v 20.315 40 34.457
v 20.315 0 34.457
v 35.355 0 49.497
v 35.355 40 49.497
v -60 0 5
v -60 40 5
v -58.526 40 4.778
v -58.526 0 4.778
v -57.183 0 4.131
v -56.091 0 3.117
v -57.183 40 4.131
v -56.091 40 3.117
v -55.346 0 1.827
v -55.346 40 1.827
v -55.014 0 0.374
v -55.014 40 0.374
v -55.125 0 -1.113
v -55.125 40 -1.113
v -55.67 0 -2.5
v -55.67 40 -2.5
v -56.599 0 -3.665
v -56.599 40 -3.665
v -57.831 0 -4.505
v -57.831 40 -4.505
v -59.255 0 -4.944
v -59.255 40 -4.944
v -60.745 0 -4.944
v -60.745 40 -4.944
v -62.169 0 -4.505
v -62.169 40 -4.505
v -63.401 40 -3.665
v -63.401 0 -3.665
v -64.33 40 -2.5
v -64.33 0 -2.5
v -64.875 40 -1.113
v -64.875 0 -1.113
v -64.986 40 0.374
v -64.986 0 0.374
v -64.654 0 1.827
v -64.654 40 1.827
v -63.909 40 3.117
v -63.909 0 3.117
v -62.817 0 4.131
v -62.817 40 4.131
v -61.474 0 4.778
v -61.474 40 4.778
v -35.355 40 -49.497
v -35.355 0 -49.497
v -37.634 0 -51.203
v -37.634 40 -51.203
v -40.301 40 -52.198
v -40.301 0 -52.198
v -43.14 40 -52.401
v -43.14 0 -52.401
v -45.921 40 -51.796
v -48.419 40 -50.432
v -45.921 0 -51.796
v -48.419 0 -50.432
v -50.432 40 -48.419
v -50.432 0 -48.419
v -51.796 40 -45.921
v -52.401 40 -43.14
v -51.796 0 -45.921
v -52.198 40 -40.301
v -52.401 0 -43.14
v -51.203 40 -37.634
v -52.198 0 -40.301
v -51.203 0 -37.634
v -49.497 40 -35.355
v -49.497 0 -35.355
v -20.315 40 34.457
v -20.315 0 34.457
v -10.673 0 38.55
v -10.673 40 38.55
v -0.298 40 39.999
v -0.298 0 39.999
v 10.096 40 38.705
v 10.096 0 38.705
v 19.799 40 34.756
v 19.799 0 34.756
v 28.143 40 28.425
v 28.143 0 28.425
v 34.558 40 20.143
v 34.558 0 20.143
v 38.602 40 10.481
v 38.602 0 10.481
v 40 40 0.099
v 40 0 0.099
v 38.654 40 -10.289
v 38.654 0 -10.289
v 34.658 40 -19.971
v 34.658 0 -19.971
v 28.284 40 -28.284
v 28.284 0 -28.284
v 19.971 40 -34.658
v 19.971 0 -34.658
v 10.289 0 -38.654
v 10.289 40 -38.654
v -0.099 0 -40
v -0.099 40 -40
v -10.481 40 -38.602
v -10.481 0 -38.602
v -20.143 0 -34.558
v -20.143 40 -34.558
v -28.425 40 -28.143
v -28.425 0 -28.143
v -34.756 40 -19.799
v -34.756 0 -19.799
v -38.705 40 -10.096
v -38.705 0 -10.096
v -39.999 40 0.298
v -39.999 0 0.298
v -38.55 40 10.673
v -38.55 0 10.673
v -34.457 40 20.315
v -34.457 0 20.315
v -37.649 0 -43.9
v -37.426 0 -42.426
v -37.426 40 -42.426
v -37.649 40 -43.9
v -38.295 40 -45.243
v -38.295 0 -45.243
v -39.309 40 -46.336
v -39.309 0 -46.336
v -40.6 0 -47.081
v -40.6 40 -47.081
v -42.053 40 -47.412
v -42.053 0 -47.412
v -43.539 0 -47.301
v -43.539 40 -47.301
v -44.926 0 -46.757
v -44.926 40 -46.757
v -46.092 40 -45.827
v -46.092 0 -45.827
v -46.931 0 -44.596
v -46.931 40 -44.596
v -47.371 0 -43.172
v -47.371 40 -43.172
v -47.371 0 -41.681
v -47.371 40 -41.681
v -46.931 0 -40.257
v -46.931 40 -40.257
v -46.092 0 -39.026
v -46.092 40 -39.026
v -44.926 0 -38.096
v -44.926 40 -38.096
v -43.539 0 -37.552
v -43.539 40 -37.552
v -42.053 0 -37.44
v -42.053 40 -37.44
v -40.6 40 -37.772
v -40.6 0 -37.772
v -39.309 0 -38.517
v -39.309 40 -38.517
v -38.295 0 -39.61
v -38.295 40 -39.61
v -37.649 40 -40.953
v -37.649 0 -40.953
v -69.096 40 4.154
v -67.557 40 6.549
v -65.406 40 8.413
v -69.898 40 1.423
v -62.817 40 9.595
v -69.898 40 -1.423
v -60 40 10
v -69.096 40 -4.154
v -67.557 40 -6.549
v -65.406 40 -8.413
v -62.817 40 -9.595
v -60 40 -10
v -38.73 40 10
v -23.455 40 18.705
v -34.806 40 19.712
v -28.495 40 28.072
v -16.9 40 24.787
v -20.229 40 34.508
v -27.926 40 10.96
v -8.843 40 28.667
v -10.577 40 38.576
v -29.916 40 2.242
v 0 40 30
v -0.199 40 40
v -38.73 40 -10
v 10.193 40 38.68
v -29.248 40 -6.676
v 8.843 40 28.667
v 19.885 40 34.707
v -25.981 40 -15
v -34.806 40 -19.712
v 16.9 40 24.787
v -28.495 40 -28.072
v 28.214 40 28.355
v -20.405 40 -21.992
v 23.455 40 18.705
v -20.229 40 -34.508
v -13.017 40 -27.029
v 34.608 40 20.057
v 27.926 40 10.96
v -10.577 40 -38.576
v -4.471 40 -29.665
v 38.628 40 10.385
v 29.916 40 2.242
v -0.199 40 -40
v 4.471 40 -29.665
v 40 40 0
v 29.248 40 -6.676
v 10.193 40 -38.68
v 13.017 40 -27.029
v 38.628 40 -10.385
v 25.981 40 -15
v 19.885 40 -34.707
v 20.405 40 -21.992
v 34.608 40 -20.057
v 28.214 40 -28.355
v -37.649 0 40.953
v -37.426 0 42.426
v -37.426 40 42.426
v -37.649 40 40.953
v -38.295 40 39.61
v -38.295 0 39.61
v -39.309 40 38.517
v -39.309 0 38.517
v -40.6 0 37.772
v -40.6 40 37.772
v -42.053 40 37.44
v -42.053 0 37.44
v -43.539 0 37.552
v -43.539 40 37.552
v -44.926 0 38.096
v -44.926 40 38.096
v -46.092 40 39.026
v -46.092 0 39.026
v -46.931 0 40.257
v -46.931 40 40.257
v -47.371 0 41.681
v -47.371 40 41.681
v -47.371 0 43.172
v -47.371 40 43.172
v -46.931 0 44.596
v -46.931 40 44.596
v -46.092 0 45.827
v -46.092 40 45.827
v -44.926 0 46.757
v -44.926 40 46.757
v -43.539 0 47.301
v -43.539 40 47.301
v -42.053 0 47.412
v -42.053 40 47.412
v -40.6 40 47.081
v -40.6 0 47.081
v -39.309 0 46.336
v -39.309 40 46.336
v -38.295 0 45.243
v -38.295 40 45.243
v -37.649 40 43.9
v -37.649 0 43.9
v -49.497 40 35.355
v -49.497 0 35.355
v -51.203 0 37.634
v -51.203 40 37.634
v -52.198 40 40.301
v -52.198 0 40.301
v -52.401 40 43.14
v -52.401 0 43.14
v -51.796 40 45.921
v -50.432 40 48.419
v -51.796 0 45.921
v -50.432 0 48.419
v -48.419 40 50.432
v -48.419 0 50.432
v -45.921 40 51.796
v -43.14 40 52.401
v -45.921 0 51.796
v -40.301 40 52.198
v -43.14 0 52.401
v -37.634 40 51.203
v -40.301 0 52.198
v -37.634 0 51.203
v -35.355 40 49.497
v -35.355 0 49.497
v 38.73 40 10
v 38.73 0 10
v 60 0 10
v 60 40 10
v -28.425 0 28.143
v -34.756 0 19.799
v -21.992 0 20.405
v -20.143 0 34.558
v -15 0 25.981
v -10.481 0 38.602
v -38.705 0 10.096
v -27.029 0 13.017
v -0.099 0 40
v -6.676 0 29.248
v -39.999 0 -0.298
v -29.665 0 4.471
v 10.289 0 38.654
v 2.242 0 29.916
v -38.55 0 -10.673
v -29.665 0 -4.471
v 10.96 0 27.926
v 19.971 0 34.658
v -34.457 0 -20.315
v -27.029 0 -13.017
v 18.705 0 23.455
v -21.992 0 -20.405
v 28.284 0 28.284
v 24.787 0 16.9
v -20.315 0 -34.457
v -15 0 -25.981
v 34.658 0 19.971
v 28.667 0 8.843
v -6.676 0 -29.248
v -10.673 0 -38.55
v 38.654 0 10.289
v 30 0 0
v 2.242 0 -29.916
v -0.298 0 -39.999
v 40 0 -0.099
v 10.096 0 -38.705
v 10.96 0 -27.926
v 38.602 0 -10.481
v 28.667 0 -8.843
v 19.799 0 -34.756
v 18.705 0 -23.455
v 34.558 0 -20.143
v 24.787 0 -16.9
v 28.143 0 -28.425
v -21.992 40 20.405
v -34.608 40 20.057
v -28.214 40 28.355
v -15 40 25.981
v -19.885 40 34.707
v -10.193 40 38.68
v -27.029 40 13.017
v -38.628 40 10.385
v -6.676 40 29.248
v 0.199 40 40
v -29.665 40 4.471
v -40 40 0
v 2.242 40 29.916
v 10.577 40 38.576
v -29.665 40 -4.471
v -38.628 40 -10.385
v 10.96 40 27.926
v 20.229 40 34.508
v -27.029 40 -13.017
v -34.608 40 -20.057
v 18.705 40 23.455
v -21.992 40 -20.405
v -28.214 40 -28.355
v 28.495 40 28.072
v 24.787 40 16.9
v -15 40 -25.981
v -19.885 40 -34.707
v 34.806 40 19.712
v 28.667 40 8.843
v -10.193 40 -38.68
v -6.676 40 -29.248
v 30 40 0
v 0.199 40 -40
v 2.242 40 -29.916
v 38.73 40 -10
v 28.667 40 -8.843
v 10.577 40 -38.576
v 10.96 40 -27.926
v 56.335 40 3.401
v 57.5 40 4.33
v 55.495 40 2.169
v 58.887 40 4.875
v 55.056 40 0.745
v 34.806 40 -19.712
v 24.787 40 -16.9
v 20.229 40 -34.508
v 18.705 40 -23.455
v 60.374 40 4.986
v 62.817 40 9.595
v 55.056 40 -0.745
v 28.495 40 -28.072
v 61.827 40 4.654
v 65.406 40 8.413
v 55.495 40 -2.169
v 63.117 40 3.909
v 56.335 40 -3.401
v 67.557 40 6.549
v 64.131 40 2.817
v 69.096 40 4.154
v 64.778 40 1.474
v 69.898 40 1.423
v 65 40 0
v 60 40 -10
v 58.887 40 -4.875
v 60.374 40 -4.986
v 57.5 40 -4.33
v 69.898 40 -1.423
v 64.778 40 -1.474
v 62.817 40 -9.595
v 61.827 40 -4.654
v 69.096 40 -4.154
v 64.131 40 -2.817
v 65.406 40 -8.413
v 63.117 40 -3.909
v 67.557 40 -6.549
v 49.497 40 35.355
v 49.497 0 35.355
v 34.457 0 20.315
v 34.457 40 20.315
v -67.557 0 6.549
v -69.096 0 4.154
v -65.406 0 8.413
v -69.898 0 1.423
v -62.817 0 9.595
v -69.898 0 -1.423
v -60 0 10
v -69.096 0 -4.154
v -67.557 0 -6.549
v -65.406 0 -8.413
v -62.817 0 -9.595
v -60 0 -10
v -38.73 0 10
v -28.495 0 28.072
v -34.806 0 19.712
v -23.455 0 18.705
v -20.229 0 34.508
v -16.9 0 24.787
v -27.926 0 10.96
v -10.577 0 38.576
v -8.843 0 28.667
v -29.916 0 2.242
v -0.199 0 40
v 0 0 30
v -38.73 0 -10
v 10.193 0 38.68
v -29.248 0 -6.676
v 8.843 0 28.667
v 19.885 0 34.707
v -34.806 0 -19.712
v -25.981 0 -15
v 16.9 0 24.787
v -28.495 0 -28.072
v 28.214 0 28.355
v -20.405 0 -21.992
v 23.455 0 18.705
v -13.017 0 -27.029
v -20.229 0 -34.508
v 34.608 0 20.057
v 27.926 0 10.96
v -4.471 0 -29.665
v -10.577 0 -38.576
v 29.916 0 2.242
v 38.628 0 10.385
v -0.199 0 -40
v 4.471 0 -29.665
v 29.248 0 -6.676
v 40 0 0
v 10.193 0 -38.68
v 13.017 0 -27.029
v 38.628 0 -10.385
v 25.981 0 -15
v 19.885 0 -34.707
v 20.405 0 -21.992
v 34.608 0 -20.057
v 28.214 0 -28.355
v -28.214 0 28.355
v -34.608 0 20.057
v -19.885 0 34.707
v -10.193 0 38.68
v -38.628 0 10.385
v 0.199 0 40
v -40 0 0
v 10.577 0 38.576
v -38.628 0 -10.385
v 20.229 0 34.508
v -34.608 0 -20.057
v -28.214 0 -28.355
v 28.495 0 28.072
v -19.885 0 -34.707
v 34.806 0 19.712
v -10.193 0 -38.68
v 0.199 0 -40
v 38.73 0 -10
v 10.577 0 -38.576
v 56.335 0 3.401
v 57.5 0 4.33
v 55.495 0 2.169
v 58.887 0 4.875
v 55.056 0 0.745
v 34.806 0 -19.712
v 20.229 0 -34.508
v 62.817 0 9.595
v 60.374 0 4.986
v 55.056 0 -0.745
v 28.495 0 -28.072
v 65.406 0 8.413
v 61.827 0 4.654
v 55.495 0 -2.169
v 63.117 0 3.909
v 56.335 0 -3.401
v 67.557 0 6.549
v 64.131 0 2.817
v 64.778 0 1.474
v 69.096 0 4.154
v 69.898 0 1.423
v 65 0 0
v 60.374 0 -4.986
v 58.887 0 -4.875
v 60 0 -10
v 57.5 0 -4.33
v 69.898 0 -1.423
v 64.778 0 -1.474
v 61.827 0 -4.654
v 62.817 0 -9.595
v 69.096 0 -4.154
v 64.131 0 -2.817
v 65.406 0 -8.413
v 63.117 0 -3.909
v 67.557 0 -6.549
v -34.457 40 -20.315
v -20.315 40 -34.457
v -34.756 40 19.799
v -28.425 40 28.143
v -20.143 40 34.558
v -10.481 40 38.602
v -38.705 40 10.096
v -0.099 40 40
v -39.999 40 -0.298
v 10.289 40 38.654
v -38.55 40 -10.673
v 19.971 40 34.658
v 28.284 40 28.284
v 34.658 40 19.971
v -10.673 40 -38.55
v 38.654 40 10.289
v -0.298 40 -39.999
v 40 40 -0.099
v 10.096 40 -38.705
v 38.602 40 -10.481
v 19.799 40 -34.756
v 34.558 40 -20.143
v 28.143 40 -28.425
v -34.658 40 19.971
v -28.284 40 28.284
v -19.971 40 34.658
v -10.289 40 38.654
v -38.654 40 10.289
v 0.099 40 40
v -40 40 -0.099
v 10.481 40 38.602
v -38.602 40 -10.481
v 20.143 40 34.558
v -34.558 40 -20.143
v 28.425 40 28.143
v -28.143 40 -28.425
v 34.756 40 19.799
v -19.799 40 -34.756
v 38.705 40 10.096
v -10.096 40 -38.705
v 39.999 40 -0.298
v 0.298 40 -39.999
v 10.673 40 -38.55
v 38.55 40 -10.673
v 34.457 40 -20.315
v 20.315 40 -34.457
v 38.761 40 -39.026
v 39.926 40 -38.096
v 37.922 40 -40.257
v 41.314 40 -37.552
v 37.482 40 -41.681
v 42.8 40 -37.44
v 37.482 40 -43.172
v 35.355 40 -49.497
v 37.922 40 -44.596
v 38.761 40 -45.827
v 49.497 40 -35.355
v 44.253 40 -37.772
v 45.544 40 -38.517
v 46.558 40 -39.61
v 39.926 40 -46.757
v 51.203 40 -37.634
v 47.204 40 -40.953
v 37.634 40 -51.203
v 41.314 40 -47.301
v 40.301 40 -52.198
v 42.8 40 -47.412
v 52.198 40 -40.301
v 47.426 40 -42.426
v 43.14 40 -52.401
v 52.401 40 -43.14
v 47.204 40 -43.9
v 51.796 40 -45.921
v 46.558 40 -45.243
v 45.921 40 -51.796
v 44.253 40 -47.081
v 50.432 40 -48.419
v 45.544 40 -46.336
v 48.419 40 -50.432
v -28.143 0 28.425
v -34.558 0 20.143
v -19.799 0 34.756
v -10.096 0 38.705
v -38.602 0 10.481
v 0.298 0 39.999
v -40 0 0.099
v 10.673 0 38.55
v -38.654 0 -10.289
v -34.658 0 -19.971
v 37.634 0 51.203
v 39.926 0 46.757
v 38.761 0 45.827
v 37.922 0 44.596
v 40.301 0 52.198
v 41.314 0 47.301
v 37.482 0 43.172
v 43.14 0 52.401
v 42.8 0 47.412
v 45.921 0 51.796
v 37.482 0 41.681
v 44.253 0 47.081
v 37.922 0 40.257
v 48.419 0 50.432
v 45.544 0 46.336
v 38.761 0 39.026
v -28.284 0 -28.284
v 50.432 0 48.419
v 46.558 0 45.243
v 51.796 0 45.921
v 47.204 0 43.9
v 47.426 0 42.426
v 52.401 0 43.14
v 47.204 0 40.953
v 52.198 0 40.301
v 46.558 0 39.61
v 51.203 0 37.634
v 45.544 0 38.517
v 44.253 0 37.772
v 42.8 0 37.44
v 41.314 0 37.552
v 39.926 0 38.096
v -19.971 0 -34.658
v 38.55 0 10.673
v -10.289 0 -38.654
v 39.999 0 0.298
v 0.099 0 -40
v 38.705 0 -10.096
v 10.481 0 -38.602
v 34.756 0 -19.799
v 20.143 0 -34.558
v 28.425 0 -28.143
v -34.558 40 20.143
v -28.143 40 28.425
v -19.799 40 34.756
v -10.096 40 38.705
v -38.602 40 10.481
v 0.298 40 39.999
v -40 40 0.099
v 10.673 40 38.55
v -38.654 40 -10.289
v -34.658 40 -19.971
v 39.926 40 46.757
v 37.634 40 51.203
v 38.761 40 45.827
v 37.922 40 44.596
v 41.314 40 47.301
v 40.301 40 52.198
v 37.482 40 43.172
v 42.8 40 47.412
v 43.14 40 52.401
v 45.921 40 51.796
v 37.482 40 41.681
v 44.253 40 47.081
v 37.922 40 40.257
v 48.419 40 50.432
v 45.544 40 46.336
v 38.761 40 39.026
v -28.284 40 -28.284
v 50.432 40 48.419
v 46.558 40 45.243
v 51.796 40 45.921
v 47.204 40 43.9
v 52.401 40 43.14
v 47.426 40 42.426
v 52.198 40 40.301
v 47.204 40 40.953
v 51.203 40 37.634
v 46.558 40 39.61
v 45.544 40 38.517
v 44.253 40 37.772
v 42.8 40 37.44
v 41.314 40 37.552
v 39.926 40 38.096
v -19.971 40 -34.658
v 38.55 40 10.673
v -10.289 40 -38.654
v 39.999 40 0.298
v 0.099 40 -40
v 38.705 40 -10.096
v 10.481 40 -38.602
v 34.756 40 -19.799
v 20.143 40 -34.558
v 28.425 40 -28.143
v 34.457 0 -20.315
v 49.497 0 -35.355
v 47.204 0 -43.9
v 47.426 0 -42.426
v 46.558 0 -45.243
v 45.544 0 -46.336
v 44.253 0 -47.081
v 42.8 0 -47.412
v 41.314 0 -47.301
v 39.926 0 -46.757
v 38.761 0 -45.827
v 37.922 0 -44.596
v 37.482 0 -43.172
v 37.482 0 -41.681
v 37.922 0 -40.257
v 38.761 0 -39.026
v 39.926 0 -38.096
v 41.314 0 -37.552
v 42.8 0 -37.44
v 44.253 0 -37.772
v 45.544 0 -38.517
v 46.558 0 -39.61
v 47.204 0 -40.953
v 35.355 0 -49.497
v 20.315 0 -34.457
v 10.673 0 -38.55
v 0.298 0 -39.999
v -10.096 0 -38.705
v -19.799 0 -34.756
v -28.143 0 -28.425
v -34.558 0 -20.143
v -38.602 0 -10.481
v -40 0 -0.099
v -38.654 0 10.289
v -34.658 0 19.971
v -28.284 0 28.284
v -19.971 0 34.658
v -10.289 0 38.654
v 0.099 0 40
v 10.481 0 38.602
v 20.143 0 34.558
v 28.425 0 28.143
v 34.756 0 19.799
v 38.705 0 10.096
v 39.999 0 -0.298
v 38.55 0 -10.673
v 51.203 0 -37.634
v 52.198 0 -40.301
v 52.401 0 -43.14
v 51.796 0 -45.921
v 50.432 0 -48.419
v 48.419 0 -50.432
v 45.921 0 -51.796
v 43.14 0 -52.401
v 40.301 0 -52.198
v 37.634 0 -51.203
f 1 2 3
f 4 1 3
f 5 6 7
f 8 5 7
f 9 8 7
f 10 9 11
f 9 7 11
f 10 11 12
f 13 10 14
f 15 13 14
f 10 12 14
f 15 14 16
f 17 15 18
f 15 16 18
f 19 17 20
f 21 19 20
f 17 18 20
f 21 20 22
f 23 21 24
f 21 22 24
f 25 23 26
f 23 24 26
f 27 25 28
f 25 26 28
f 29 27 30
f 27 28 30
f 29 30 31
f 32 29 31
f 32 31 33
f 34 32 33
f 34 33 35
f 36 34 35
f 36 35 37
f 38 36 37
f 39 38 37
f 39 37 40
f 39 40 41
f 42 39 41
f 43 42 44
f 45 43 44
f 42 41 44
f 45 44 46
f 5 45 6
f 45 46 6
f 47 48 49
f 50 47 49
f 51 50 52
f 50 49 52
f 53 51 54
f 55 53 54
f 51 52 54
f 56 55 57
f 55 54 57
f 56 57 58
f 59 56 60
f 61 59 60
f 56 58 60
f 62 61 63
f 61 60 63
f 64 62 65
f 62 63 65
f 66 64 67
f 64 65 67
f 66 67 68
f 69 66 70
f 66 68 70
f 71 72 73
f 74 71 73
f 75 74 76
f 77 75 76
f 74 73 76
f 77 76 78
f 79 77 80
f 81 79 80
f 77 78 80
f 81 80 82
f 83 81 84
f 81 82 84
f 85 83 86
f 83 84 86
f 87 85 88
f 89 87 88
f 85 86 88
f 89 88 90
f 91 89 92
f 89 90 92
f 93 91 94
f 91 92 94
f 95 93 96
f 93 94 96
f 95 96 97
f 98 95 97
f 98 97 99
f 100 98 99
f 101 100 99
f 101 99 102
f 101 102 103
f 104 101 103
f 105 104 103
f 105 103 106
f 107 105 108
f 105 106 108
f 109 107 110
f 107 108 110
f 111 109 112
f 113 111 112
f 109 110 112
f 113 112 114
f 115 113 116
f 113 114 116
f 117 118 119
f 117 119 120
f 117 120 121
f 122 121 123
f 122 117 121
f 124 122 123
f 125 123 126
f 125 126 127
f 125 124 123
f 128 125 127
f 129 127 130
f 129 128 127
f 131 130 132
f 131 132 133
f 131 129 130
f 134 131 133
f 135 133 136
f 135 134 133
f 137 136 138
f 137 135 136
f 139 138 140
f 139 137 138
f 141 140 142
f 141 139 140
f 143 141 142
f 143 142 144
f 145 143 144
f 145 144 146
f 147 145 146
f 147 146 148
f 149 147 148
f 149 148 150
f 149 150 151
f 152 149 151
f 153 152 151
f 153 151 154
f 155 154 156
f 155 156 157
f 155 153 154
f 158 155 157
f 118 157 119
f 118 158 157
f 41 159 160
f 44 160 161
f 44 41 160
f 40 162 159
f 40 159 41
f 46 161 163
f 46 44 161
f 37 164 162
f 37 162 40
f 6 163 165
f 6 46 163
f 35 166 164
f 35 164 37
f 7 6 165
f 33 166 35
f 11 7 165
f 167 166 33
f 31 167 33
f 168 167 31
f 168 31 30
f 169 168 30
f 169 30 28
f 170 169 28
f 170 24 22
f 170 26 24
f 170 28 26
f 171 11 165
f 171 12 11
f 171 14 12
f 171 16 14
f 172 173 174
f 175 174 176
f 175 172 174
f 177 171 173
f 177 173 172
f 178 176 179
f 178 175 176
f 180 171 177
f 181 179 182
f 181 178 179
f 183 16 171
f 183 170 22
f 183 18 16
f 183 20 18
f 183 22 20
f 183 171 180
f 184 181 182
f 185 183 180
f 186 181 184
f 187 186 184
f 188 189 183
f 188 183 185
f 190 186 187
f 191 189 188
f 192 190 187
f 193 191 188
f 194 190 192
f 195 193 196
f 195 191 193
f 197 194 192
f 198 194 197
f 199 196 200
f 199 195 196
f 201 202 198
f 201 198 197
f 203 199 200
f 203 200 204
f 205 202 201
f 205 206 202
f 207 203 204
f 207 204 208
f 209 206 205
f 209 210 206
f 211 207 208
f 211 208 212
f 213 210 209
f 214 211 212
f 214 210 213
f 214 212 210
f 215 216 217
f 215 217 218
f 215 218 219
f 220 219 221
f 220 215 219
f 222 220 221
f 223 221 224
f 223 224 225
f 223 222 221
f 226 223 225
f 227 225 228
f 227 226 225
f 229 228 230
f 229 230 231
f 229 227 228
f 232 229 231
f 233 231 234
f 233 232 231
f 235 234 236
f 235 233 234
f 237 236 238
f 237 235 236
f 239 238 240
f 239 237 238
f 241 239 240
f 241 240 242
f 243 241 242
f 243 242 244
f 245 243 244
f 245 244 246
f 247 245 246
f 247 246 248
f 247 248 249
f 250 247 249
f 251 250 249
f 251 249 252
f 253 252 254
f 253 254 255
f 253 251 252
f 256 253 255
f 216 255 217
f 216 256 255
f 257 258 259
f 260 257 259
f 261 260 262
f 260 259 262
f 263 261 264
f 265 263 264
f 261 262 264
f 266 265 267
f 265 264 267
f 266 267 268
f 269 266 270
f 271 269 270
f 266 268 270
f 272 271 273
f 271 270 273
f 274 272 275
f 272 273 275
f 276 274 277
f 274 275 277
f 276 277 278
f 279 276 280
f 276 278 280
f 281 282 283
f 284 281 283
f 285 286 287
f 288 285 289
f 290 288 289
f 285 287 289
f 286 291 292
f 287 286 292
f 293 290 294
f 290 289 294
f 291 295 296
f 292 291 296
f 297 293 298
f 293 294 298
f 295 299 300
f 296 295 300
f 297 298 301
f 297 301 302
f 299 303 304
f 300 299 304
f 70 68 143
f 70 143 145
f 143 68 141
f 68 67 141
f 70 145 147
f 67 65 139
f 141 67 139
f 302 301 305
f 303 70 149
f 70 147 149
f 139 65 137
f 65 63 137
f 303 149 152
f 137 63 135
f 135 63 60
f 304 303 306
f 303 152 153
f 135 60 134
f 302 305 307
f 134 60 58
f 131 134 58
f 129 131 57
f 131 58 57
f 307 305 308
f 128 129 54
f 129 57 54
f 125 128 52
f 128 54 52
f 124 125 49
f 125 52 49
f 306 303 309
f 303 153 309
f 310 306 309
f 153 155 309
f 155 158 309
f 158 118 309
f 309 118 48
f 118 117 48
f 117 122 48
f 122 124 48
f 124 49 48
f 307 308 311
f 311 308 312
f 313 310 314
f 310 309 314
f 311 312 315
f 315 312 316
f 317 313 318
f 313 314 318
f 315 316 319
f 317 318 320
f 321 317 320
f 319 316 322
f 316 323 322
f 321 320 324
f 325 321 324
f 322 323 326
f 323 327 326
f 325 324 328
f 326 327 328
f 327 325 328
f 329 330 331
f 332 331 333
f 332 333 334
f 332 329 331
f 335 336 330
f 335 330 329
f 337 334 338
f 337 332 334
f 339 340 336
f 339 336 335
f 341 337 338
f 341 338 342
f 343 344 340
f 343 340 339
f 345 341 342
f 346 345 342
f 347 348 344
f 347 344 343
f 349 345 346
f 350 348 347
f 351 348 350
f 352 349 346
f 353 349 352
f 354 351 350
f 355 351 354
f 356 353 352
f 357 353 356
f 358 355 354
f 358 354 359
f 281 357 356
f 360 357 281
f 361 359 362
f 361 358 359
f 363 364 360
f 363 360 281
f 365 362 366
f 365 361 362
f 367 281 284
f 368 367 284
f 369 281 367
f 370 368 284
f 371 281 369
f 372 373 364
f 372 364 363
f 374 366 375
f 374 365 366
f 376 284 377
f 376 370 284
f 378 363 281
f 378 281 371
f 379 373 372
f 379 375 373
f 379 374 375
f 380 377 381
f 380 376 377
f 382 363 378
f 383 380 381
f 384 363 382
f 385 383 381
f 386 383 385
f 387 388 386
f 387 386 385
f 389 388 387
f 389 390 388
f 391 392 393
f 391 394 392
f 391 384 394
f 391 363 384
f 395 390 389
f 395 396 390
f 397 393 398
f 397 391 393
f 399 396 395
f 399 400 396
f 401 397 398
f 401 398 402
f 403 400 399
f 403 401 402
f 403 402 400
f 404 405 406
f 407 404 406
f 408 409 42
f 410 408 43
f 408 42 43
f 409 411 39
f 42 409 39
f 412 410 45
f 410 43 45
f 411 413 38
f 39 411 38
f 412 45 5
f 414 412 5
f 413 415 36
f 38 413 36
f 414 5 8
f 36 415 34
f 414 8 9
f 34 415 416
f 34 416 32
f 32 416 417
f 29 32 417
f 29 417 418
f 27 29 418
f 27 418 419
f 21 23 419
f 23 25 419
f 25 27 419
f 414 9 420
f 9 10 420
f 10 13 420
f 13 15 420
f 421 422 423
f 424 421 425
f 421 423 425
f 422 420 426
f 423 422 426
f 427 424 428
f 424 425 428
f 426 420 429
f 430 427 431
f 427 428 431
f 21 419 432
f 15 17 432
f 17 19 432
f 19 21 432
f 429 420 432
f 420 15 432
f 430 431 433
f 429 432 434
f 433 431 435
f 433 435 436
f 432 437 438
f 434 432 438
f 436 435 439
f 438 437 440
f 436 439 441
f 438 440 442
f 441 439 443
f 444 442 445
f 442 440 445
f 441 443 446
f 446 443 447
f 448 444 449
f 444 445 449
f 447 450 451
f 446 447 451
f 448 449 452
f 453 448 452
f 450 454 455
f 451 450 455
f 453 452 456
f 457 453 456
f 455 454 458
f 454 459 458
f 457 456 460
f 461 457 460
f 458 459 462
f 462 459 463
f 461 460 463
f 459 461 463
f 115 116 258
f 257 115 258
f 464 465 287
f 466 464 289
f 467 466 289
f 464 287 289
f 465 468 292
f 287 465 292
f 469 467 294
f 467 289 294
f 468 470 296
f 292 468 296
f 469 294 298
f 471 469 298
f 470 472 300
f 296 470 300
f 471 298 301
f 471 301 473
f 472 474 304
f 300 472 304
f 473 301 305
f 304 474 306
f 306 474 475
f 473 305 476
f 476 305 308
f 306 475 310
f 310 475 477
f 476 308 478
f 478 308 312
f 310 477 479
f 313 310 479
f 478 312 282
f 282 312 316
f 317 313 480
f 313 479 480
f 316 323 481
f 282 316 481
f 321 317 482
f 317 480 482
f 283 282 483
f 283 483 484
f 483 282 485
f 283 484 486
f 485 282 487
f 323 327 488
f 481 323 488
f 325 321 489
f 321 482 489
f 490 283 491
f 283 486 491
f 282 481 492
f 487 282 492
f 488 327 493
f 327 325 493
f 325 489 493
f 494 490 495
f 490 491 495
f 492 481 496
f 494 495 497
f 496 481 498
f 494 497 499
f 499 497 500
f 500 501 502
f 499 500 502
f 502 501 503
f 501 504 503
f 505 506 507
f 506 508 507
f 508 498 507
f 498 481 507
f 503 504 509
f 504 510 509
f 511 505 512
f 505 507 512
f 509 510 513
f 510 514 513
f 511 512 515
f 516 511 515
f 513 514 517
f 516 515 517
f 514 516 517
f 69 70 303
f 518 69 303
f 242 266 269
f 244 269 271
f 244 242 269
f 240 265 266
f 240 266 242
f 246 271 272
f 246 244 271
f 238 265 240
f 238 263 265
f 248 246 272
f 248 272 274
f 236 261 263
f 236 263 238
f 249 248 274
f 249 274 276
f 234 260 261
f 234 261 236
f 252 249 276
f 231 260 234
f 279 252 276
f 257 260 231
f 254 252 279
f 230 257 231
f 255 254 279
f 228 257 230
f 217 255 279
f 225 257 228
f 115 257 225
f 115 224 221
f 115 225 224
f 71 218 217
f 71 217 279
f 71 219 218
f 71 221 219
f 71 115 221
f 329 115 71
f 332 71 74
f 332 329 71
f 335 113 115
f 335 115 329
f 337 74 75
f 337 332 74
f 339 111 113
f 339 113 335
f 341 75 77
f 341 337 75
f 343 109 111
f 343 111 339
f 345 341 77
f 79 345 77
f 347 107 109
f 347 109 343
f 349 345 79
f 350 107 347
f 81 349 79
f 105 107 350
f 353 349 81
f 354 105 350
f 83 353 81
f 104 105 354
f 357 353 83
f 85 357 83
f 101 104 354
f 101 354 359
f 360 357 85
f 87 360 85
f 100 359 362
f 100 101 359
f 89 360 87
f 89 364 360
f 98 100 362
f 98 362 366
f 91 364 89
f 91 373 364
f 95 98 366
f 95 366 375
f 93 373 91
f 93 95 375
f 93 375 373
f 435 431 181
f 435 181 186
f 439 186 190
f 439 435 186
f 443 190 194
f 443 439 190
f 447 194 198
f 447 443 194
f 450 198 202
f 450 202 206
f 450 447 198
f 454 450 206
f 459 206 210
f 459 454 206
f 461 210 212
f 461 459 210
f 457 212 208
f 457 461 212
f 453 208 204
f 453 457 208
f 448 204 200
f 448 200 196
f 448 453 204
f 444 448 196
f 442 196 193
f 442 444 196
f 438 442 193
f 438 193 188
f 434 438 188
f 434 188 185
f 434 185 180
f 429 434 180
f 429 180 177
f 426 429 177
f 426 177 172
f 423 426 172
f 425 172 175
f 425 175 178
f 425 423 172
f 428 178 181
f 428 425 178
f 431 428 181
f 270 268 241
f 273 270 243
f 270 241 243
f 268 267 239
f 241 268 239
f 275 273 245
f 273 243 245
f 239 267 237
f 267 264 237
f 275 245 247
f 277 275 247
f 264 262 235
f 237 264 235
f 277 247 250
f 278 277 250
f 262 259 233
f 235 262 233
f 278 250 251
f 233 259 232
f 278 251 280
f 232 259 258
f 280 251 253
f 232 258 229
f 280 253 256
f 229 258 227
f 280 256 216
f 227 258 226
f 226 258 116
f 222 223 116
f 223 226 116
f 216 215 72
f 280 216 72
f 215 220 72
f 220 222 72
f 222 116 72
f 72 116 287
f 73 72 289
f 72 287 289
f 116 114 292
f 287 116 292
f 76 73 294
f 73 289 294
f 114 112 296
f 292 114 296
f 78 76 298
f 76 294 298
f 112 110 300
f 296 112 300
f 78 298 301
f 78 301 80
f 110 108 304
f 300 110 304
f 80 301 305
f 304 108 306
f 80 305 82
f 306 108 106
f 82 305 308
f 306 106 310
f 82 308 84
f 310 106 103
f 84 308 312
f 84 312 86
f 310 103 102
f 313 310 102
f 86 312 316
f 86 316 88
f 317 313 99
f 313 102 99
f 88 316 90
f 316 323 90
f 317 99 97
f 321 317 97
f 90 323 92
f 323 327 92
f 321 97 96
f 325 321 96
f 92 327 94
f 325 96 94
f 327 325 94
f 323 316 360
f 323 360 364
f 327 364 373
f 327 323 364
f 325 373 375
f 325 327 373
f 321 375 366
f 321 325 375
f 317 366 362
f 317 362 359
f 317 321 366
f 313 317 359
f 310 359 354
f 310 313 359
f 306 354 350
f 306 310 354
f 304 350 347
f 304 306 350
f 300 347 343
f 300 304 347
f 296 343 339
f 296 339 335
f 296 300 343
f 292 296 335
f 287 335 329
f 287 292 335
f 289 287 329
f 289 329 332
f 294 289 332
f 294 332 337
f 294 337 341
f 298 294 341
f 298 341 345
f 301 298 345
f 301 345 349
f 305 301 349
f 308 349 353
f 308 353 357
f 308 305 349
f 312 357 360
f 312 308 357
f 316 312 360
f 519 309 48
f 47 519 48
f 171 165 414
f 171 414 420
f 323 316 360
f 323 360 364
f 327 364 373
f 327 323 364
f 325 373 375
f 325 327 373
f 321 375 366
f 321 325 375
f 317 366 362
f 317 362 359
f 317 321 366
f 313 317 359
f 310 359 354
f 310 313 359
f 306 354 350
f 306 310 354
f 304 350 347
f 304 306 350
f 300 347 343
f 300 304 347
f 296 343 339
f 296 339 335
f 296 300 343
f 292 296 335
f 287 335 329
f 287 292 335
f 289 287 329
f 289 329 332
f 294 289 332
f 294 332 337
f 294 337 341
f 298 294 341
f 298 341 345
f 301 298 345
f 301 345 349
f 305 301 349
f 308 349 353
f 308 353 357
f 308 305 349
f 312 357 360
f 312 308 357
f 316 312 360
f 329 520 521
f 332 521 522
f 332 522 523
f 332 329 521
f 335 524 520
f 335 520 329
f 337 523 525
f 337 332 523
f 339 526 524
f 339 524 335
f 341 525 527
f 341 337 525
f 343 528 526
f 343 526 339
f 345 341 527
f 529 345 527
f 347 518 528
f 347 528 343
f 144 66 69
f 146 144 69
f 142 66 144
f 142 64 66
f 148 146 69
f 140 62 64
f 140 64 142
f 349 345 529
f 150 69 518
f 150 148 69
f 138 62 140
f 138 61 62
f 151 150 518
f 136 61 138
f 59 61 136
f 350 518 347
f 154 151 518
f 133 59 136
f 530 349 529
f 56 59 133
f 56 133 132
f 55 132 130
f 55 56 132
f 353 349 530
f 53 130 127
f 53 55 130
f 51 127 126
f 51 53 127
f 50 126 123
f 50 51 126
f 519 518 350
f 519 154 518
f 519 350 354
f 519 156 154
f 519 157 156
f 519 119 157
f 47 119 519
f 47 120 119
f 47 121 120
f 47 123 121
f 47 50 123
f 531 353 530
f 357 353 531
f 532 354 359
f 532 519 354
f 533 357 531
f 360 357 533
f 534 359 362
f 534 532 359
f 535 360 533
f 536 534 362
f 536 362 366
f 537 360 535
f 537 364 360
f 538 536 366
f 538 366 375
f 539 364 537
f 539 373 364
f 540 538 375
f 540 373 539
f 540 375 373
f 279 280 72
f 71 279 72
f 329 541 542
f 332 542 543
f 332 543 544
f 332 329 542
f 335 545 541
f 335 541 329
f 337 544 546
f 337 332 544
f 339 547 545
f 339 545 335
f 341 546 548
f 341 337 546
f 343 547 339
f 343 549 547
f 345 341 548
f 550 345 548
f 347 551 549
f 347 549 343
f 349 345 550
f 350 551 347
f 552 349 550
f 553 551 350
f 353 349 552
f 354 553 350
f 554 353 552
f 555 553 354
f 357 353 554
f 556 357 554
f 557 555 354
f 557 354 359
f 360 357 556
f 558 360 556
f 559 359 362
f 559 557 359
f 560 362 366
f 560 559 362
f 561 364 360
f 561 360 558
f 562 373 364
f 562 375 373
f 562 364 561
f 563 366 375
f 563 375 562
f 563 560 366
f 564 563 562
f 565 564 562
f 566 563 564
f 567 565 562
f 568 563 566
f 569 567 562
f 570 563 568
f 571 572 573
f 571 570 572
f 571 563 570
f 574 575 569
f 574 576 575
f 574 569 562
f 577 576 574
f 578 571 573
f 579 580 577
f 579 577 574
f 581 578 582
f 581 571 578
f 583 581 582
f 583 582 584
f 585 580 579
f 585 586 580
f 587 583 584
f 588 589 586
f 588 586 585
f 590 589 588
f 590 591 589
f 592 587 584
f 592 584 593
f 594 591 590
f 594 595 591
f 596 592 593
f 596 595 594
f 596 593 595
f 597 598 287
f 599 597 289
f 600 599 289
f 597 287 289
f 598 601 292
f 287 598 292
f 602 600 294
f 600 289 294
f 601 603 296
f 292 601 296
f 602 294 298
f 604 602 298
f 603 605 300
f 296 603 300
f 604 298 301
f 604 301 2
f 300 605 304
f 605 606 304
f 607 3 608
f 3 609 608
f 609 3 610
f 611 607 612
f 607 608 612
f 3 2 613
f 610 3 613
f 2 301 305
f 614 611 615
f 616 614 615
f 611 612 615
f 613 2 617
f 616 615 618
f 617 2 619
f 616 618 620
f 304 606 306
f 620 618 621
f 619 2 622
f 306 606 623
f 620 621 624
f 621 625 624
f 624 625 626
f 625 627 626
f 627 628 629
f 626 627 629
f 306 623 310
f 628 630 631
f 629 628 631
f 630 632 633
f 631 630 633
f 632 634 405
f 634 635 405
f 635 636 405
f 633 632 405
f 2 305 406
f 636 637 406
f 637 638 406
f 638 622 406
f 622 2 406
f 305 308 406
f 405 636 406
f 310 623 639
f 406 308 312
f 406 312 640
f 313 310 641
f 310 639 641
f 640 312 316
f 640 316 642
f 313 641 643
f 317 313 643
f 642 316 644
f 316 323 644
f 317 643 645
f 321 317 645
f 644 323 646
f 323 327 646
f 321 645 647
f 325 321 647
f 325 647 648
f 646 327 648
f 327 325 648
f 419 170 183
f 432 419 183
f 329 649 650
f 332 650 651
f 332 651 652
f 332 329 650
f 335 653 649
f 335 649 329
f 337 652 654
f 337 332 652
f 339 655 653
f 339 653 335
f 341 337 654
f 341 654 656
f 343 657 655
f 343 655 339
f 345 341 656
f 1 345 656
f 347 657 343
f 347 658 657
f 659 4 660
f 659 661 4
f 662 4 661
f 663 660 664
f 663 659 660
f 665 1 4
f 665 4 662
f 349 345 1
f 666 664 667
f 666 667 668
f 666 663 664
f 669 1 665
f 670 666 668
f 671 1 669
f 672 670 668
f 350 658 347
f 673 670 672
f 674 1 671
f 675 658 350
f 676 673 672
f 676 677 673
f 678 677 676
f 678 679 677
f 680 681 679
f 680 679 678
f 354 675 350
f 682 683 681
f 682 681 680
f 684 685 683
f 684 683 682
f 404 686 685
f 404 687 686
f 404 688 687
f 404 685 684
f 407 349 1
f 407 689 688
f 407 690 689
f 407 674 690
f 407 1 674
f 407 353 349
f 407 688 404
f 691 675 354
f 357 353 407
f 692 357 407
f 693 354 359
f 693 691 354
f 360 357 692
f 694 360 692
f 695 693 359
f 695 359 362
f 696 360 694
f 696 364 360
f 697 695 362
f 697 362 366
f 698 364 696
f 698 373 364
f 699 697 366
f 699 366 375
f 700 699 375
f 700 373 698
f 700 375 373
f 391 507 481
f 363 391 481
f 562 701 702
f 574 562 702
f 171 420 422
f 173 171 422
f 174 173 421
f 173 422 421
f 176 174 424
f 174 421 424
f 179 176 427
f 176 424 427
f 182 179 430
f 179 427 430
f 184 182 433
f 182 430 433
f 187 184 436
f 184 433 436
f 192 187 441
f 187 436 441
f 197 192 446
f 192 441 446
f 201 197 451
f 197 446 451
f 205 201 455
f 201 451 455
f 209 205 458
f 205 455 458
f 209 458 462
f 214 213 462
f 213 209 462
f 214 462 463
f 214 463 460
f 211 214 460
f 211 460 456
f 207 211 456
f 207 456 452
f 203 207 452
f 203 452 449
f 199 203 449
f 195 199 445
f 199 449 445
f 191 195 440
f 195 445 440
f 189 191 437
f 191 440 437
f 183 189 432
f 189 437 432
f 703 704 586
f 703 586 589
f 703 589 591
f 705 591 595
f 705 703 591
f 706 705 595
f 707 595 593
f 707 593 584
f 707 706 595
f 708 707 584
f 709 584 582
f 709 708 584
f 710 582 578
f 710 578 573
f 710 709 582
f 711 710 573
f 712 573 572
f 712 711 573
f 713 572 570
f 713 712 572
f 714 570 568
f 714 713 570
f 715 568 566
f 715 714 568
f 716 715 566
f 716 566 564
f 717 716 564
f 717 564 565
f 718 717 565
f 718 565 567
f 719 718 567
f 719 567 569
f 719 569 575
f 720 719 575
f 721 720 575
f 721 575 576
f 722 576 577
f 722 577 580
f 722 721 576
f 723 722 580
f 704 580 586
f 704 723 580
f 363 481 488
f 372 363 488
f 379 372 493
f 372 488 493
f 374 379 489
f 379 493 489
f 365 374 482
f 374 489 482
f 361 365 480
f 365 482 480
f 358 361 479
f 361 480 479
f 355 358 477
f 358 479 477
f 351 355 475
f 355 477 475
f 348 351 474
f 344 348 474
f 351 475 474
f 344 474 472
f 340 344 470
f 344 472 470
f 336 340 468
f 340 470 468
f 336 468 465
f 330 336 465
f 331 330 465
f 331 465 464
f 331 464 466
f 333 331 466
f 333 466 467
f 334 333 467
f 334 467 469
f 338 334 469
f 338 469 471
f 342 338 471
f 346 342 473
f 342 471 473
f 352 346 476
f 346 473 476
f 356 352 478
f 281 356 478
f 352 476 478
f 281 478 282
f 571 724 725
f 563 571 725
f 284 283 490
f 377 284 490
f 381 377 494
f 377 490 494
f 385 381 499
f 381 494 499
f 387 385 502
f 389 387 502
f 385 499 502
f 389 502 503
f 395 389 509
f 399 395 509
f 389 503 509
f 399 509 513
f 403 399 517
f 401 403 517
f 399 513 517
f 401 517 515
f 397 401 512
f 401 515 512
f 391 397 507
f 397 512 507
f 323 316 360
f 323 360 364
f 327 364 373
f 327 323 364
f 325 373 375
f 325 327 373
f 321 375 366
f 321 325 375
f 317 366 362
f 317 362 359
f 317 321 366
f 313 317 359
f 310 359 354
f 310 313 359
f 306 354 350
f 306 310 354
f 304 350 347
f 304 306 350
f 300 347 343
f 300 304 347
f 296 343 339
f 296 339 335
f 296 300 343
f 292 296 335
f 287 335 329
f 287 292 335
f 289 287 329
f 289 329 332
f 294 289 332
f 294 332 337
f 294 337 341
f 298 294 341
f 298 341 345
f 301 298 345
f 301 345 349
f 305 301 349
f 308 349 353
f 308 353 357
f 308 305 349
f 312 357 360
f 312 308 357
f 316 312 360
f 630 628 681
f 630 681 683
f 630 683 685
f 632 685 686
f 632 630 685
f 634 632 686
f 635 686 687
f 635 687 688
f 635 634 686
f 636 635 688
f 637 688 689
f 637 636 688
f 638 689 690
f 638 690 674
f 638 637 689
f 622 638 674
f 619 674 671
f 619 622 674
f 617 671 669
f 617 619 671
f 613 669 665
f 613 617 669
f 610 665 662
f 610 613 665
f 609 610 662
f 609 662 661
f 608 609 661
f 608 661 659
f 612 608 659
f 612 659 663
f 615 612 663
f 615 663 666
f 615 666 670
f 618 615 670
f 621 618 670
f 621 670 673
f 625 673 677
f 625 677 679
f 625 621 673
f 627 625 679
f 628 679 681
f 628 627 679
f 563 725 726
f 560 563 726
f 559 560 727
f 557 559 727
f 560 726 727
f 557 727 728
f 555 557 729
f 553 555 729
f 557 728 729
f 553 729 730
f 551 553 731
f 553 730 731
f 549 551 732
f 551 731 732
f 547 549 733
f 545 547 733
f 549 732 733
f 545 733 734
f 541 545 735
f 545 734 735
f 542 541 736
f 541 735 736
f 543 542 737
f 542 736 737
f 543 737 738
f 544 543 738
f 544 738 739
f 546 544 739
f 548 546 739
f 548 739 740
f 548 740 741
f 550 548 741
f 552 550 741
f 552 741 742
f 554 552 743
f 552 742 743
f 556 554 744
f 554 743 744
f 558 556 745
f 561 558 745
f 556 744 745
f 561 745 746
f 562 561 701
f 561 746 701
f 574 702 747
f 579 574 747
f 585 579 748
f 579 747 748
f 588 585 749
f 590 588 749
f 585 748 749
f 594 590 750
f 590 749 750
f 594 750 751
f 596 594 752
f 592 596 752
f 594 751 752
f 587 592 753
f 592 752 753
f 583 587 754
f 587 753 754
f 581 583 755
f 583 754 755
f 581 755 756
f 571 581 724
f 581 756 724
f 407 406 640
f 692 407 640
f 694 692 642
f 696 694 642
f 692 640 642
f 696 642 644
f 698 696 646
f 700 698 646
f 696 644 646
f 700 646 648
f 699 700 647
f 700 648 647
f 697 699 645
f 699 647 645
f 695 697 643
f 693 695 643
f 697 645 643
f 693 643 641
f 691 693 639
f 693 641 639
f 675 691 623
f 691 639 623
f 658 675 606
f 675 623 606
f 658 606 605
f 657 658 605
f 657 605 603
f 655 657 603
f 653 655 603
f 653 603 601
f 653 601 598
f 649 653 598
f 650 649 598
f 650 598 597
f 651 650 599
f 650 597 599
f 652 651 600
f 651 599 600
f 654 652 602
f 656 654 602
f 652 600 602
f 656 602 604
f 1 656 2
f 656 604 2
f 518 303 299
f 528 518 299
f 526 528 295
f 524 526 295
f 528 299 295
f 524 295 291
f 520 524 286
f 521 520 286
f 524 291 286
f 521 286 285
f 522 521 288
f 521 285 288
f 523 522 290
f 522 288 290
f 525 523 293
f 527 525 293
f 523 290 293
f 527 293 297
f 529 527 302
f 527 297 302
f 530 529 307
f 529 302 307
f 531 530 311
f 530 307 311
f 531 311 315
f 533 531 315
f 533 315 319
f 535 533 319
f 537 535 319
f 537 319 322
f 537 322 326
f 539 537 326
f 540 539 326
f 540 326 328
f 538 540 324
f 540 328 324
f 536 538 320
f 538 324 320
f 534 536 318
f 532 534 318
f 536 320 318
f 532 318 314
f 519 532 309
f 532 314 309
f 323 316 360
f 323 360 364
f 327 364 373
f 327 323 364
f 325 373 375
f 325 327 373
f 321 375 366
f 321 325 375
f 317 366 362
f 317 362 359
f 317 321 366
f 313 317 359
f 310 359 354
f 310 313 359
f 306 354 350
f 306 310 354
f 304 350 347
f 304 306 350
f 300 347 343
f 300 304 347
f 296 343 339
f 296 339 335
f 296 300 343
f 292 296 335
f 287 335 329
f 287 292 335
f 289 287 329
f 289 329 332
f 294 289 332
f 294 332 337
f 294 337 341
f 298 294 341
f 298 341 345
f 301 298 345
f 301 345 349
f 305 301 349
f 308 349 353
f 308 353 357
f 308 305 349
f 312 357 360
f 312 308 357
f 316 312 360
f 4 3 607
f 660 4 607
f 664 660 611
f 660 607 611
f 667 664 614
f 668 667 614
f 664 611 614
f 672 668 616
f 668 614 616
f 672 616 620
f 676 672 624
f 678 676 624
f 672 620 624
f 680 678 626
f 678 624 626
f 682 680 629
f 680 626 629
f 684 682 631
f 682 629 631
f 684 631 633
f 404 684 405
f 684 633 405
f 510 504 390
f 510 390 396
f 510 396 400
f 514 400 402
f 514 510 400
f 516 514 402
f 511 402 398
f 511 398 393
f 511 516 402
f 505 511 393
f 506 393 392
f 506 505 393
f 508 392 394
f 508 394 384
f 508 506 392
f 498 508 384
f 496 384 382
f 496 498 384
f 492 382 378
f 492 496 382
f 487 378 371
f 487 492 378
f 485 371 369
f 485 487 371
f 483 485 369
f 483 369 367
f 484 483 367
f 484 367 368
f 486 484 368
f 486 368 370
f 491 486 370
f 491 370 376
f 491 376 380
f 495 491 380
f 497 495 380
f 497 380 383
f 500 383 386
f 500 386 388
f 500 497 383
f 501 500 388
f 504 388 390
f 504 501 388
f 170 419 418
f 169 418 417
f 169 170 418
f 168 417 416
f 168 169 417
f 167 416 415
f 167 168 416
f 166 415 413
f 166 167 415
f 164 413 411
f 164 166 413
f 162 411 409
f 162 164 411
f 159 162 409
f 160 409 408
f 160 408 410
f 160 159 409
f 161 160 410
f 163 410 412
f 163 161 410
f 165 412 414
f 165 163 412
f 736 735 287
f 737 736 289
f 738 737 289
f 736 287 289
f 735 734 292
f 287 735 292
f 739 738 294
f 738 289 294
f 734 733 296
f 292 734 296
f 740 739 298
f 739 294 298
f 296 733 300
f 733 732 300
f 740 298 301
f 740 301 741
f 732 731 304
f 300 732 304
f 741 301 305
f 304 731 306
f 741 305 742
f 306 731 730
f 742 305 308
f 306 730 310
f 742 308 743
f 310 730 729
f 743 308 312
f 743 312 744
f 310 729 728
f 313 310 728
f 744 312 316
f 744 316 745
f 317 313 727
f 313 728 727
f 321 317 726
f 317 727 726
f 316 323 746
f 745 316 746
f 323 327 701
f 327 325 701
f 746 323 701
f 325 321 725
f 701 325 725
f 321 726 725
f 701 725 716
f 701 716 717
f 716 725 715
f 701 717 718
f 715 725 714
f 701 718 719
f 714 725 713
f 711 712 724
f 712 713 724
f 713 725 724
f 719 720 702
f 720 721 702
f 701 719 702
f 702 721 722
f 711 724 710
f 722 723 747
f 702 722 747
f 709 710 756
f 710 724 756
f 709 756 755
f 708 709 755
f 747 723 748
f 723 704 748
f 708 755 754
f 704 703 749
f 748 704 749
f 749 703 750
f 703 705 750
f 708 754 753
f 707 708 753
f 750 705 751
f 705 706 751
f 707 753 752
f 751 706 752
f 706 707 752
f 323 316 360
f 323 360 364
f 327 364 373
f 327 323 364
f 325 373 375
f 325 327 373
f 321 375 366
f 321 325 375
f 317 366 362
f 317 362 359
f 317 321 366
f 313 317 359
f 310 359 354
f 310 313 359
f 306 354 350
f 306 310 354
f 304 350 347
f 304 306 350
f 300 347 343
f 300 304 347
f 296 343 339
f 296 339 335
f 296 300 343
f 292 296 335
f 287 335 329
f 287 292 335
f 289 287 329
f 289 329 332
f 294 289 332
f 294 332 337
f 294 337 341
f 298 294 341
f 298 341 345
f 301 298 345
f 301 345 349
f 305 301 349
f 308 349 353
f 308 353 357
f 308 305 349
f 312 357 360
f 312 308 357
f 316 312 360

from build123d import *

# Parameters (mm, degrees)
SKETCH1_R                  = 40
SKETCH1_R_2                = 30
BOSS_EXTRUDE1_DEPTH        = 40
SKETCH2_R                  = 10
SKETCH2_R_2                = 5
BOSS_EXTRUDE2_DEPTH        = 40
BOSS_EXTRUDE3_DEPTH        = 40
BOSS_EXTRUDE10_DEPTH       = 40
CIRPATTERN13_OUTLINE_R     = 5
CIRPATTERN13_OUTLINE_R_2   = 30
CIRPATTERN13_DEPTH         = 40
CIRPATTERN13_2_OUTLINE_R   = 5
CIRPATTERN13_2_OUTLINE_R_2 = 30
CIRPATTERN13_2_DEPTH       = 40
CIRPATTERN13_3_OUTLINE_R   = 30
CIRPATTERN13_3_OUTLINE_R_2 = 5
CIRPATTERN13_3_DEPTH       = 40
CIRPATTERN13_4_OUTLINE_R   = 30
CIRPATTERN13_4_OUTLINE_R_2 = 5
CIRPATTERN13_4_DEPTH       = 40
CIRPATTERN13_5_OUTLINE_R   = 30
CIRPATTERN13_5_OUTLINE_R_2 = 5
CIRPATTERN13_5_DEPTH       = 40


# Read off the part's stored shape, not the designer's step: CirPattern13
with BuildPart() as part:
    # Sketch1 → Boss-Extrude1 (new body)
    with BuildSketch(Plane(origin=(0, 0, 0), x_dir=(1, 0, 0), z_dir=(0, 1, 0))):
        with Locations(Location((0, 0, 0), (0, 0, 270))):
            Circle(SKETCH1_R)
        with Locations(Location((0, 0, 0), (0, 0, 270))):
            Circle(SKETCH1_R_2, mode=Mode.SUBTRACT)
    extrude(amount=BOSS_EXTRUDE1_DEPTH)



with BuildPart() as body_2:
    # Sketch2 → Boss-Extrude2 (new body)
    with BuildSketch(Plane(origin=(0, 40, 0), x_dir=(1, 0, 0), z_dir=(0, 1, 0))):
        with Locations(Location((-60, 0, 0), (0, 0, 270))):
            Circle(SKETCH2_R)
        with Locations(Location((-60, 0, 0), (0, 0, 270))):
            Circle(SKETCH2_R_2, mode=Mode.SUBTRACT)
    extrude(amount=-BOSS_EXTRUDE2_DEPTH)


with BuildPart() as part_1:
    add(part.part)

    add(body_2.part)  # Boss-Extrude3 merges body 2
    # Sketch3 → Boss-Extrude3 (add)
    with BuildSketch(Plane(origin=(0, 40, 0), x_dir=(1, 0, 0), z_dir=(0, 1, 0))):
        Polygon((-60, 10), (-38.729833462, 10), (-38.729833462, -10), align=None)
    extrude(amount=-BOSS_EXTRUDE3_DEPTH)

    # Sketch4 → Boss-Extrude10 (add)
    with BuildSketch(Plane(origin=(0, 40, 0), x_dir=(1, 0, 0), z_dir=(0, 1, 0))):
        Polygon((-60, -10), (-38.729833462, -10), (-48.078623612, 10), align=None)
    extrude(amount=-BOSS_EXTRUDE10_DEPTH)


with BuildPart() as body_2_2:
    # CirPattern13 outline → CirPattern13 (new body)
    with BuildSketch(Plane(origin=(0, 0, 0), x_dir=(1, 0, 0), z_dir=(0, 1, 0))):
        with BuildLine():
            ThreePointArc((-20.315060063, -34.457195687), (28.284271247, 28.284271247), (-34.457195687, -20.315060063))
            Line((-34.457195687, -20.315060063), (-49.497474683, -35.355339059))
            ThreePointArc((-49.497474683, -35.355339059), (-49.497474683, -49.497474683), (-35.355339059, -49.497474683))
            Line((-35.355339059, -49.497474683), (-20.315060063, -34.457195687))
        make_face()
        with Locations((-42.426406871, -42.426406871)):
            Circle(CIRPATTERN13_OUTLINE_R, mode=Mode.SUBTRACT)
        Circle(CIRPATTERN13_OUTLINE_R_2, mode=Mode.SUBTRACT)
    extrude(amount=CIRPATTERN13_DEPTH)


with BuildPart() as body_3:
    # CirPattern13 2 outline → CirPattern13 2 (new body)
    with BuildSketch(Plane(origin=(0, 0, 0), x_dir=(1, 0, 0), z_dir=(0, 1, 0))):
        with BuildLine():
            ThreePointArc((34.457195687, -20.315060063), (-28.284271247, 28.284271247), (20.315060063, -34.457195687))
            Line((20.315060063, -34.457195687), (35.355339059, -49.497474683))
            ThreePointArc((35.355339059, -49.497474683), (49.497474683, -49.497474683), (49.497474683, -35.355339059))
            Line((49.497474683, -35.355339059), (34.457195687, -20.315060063))
        make_face()
        with Locations((42.426406871, -42.426406871)):
            Circle(CIRPATTERN13_2_OUTLINE_R, mode=Mode.SUBTRACT)
        Circle(CIRPATTERN13_2_OUTLINE_R_2, mode=Mode.SUBTRACT)
    extrude(amount=CIRPATTERN13_2_DEPTH)


with BuildPart() as body_4:
    # CirPattern13 3 outline → CirPattern13 3 (new body)
    with BuildSketch(Plane(origin=(0, 0, 0), x_dir=(1, 0, 0), z_dir=(0, 1, 0))):
        with BuildLine():
            ThreePointArc((38.729833462, 10), (-40, 0), (38.729833462, -10))
            Line((38.729833462, -10), (60, -10))
            ThreePointArc((60, -10), (70, 0), (60, 10))
            Line((60, 10), (38.729833462, 10))
        make_face()
        Circle(CIRPATTERN13_3_OUTLINE_R, mode=Mode.SUBTRACT)
        with Locations((60, 0)):
            Circle(CIRPATTERN13_3_OUTLINE_R_2, mode=Mode.SUBTRACT)
    extrude(amount=CIRPATTERN13_3_DEPTH)


with BuildPart() as body_5:
    # CirPattern13 4 outline → CirPattern13 4 (new body)
    with BuildSketch(Plane(origin=(0, 0, 0), x_dir=(1, 0, 0), z_dir=(0, 1, 0))):
        with BuildLine():
            ThreePointArc((20.315060063, 34.457195687), (-28.284271247, -28.284271247), (34.457195687, 20.315060063))
            Line((34.457195687, 20.315060063), (49.497474683, 35.355339059))
            ThreePointArc((49.497474683, 35.355339059), (49.497474683, 49.497474683), (35.355339059, 49.497474683))
            Line((35.355339059, 49.497474683), (20.315060063, 34.457195687))
        make_face()
        Circle(CIRPATTERN13_4_OUTLINE_R, mode=Mode.SUBTRACT)
        with Locations((42.426406871, 42.426406871)):
            Circle(CIRPATTERN13_4_OUTLINE_R_2, mode=Mode.SUBTRACT)
    extrude(amount=CIRPATTERN13_4_DEPTH)


with BuildPart() as body_6:
    # CirPattern13 5 outline → CirPattern13 5 (new body)
    with BuildSketch(Plane(origin=(0, 0, 0), x_dir=(1, 0, 0), z_dir=(0, 1, 0))):
        with BuildLine():
            ThreePointArc((-34.457195687, 20.315060063), (28.284271247, -28.284271247), (-20.315060063, 34.457195687))
            Line((-20.315060063, 34.457195687), (-35.355339059, 49.497474683))
            ThreePointArc((-35.355339059, 49.497474683), (-49.497474683, 49.497474683), (-49.497474683, 35.355339059))
            Line((-49.497474683, 35.355339059), (-34.457195687, 20.315060063))
        make_face()
        Circle(CIRPATTERN13_5_OUTLINE_R, mode=Mode.SUBTRACT)
        with Locations((-42.426406871, 42.426406871)):
            Circle(CIRPATTERN13_5_OUTLINE_R_2, mode=Mode.SUBTRACT)
    extrude(amount=CIRPATTERN13_5_DEPTH)


solid = Compound([part_1.part, body_2_2.part, body_3.part, body_4.part, body_5.part, body_6.part])
